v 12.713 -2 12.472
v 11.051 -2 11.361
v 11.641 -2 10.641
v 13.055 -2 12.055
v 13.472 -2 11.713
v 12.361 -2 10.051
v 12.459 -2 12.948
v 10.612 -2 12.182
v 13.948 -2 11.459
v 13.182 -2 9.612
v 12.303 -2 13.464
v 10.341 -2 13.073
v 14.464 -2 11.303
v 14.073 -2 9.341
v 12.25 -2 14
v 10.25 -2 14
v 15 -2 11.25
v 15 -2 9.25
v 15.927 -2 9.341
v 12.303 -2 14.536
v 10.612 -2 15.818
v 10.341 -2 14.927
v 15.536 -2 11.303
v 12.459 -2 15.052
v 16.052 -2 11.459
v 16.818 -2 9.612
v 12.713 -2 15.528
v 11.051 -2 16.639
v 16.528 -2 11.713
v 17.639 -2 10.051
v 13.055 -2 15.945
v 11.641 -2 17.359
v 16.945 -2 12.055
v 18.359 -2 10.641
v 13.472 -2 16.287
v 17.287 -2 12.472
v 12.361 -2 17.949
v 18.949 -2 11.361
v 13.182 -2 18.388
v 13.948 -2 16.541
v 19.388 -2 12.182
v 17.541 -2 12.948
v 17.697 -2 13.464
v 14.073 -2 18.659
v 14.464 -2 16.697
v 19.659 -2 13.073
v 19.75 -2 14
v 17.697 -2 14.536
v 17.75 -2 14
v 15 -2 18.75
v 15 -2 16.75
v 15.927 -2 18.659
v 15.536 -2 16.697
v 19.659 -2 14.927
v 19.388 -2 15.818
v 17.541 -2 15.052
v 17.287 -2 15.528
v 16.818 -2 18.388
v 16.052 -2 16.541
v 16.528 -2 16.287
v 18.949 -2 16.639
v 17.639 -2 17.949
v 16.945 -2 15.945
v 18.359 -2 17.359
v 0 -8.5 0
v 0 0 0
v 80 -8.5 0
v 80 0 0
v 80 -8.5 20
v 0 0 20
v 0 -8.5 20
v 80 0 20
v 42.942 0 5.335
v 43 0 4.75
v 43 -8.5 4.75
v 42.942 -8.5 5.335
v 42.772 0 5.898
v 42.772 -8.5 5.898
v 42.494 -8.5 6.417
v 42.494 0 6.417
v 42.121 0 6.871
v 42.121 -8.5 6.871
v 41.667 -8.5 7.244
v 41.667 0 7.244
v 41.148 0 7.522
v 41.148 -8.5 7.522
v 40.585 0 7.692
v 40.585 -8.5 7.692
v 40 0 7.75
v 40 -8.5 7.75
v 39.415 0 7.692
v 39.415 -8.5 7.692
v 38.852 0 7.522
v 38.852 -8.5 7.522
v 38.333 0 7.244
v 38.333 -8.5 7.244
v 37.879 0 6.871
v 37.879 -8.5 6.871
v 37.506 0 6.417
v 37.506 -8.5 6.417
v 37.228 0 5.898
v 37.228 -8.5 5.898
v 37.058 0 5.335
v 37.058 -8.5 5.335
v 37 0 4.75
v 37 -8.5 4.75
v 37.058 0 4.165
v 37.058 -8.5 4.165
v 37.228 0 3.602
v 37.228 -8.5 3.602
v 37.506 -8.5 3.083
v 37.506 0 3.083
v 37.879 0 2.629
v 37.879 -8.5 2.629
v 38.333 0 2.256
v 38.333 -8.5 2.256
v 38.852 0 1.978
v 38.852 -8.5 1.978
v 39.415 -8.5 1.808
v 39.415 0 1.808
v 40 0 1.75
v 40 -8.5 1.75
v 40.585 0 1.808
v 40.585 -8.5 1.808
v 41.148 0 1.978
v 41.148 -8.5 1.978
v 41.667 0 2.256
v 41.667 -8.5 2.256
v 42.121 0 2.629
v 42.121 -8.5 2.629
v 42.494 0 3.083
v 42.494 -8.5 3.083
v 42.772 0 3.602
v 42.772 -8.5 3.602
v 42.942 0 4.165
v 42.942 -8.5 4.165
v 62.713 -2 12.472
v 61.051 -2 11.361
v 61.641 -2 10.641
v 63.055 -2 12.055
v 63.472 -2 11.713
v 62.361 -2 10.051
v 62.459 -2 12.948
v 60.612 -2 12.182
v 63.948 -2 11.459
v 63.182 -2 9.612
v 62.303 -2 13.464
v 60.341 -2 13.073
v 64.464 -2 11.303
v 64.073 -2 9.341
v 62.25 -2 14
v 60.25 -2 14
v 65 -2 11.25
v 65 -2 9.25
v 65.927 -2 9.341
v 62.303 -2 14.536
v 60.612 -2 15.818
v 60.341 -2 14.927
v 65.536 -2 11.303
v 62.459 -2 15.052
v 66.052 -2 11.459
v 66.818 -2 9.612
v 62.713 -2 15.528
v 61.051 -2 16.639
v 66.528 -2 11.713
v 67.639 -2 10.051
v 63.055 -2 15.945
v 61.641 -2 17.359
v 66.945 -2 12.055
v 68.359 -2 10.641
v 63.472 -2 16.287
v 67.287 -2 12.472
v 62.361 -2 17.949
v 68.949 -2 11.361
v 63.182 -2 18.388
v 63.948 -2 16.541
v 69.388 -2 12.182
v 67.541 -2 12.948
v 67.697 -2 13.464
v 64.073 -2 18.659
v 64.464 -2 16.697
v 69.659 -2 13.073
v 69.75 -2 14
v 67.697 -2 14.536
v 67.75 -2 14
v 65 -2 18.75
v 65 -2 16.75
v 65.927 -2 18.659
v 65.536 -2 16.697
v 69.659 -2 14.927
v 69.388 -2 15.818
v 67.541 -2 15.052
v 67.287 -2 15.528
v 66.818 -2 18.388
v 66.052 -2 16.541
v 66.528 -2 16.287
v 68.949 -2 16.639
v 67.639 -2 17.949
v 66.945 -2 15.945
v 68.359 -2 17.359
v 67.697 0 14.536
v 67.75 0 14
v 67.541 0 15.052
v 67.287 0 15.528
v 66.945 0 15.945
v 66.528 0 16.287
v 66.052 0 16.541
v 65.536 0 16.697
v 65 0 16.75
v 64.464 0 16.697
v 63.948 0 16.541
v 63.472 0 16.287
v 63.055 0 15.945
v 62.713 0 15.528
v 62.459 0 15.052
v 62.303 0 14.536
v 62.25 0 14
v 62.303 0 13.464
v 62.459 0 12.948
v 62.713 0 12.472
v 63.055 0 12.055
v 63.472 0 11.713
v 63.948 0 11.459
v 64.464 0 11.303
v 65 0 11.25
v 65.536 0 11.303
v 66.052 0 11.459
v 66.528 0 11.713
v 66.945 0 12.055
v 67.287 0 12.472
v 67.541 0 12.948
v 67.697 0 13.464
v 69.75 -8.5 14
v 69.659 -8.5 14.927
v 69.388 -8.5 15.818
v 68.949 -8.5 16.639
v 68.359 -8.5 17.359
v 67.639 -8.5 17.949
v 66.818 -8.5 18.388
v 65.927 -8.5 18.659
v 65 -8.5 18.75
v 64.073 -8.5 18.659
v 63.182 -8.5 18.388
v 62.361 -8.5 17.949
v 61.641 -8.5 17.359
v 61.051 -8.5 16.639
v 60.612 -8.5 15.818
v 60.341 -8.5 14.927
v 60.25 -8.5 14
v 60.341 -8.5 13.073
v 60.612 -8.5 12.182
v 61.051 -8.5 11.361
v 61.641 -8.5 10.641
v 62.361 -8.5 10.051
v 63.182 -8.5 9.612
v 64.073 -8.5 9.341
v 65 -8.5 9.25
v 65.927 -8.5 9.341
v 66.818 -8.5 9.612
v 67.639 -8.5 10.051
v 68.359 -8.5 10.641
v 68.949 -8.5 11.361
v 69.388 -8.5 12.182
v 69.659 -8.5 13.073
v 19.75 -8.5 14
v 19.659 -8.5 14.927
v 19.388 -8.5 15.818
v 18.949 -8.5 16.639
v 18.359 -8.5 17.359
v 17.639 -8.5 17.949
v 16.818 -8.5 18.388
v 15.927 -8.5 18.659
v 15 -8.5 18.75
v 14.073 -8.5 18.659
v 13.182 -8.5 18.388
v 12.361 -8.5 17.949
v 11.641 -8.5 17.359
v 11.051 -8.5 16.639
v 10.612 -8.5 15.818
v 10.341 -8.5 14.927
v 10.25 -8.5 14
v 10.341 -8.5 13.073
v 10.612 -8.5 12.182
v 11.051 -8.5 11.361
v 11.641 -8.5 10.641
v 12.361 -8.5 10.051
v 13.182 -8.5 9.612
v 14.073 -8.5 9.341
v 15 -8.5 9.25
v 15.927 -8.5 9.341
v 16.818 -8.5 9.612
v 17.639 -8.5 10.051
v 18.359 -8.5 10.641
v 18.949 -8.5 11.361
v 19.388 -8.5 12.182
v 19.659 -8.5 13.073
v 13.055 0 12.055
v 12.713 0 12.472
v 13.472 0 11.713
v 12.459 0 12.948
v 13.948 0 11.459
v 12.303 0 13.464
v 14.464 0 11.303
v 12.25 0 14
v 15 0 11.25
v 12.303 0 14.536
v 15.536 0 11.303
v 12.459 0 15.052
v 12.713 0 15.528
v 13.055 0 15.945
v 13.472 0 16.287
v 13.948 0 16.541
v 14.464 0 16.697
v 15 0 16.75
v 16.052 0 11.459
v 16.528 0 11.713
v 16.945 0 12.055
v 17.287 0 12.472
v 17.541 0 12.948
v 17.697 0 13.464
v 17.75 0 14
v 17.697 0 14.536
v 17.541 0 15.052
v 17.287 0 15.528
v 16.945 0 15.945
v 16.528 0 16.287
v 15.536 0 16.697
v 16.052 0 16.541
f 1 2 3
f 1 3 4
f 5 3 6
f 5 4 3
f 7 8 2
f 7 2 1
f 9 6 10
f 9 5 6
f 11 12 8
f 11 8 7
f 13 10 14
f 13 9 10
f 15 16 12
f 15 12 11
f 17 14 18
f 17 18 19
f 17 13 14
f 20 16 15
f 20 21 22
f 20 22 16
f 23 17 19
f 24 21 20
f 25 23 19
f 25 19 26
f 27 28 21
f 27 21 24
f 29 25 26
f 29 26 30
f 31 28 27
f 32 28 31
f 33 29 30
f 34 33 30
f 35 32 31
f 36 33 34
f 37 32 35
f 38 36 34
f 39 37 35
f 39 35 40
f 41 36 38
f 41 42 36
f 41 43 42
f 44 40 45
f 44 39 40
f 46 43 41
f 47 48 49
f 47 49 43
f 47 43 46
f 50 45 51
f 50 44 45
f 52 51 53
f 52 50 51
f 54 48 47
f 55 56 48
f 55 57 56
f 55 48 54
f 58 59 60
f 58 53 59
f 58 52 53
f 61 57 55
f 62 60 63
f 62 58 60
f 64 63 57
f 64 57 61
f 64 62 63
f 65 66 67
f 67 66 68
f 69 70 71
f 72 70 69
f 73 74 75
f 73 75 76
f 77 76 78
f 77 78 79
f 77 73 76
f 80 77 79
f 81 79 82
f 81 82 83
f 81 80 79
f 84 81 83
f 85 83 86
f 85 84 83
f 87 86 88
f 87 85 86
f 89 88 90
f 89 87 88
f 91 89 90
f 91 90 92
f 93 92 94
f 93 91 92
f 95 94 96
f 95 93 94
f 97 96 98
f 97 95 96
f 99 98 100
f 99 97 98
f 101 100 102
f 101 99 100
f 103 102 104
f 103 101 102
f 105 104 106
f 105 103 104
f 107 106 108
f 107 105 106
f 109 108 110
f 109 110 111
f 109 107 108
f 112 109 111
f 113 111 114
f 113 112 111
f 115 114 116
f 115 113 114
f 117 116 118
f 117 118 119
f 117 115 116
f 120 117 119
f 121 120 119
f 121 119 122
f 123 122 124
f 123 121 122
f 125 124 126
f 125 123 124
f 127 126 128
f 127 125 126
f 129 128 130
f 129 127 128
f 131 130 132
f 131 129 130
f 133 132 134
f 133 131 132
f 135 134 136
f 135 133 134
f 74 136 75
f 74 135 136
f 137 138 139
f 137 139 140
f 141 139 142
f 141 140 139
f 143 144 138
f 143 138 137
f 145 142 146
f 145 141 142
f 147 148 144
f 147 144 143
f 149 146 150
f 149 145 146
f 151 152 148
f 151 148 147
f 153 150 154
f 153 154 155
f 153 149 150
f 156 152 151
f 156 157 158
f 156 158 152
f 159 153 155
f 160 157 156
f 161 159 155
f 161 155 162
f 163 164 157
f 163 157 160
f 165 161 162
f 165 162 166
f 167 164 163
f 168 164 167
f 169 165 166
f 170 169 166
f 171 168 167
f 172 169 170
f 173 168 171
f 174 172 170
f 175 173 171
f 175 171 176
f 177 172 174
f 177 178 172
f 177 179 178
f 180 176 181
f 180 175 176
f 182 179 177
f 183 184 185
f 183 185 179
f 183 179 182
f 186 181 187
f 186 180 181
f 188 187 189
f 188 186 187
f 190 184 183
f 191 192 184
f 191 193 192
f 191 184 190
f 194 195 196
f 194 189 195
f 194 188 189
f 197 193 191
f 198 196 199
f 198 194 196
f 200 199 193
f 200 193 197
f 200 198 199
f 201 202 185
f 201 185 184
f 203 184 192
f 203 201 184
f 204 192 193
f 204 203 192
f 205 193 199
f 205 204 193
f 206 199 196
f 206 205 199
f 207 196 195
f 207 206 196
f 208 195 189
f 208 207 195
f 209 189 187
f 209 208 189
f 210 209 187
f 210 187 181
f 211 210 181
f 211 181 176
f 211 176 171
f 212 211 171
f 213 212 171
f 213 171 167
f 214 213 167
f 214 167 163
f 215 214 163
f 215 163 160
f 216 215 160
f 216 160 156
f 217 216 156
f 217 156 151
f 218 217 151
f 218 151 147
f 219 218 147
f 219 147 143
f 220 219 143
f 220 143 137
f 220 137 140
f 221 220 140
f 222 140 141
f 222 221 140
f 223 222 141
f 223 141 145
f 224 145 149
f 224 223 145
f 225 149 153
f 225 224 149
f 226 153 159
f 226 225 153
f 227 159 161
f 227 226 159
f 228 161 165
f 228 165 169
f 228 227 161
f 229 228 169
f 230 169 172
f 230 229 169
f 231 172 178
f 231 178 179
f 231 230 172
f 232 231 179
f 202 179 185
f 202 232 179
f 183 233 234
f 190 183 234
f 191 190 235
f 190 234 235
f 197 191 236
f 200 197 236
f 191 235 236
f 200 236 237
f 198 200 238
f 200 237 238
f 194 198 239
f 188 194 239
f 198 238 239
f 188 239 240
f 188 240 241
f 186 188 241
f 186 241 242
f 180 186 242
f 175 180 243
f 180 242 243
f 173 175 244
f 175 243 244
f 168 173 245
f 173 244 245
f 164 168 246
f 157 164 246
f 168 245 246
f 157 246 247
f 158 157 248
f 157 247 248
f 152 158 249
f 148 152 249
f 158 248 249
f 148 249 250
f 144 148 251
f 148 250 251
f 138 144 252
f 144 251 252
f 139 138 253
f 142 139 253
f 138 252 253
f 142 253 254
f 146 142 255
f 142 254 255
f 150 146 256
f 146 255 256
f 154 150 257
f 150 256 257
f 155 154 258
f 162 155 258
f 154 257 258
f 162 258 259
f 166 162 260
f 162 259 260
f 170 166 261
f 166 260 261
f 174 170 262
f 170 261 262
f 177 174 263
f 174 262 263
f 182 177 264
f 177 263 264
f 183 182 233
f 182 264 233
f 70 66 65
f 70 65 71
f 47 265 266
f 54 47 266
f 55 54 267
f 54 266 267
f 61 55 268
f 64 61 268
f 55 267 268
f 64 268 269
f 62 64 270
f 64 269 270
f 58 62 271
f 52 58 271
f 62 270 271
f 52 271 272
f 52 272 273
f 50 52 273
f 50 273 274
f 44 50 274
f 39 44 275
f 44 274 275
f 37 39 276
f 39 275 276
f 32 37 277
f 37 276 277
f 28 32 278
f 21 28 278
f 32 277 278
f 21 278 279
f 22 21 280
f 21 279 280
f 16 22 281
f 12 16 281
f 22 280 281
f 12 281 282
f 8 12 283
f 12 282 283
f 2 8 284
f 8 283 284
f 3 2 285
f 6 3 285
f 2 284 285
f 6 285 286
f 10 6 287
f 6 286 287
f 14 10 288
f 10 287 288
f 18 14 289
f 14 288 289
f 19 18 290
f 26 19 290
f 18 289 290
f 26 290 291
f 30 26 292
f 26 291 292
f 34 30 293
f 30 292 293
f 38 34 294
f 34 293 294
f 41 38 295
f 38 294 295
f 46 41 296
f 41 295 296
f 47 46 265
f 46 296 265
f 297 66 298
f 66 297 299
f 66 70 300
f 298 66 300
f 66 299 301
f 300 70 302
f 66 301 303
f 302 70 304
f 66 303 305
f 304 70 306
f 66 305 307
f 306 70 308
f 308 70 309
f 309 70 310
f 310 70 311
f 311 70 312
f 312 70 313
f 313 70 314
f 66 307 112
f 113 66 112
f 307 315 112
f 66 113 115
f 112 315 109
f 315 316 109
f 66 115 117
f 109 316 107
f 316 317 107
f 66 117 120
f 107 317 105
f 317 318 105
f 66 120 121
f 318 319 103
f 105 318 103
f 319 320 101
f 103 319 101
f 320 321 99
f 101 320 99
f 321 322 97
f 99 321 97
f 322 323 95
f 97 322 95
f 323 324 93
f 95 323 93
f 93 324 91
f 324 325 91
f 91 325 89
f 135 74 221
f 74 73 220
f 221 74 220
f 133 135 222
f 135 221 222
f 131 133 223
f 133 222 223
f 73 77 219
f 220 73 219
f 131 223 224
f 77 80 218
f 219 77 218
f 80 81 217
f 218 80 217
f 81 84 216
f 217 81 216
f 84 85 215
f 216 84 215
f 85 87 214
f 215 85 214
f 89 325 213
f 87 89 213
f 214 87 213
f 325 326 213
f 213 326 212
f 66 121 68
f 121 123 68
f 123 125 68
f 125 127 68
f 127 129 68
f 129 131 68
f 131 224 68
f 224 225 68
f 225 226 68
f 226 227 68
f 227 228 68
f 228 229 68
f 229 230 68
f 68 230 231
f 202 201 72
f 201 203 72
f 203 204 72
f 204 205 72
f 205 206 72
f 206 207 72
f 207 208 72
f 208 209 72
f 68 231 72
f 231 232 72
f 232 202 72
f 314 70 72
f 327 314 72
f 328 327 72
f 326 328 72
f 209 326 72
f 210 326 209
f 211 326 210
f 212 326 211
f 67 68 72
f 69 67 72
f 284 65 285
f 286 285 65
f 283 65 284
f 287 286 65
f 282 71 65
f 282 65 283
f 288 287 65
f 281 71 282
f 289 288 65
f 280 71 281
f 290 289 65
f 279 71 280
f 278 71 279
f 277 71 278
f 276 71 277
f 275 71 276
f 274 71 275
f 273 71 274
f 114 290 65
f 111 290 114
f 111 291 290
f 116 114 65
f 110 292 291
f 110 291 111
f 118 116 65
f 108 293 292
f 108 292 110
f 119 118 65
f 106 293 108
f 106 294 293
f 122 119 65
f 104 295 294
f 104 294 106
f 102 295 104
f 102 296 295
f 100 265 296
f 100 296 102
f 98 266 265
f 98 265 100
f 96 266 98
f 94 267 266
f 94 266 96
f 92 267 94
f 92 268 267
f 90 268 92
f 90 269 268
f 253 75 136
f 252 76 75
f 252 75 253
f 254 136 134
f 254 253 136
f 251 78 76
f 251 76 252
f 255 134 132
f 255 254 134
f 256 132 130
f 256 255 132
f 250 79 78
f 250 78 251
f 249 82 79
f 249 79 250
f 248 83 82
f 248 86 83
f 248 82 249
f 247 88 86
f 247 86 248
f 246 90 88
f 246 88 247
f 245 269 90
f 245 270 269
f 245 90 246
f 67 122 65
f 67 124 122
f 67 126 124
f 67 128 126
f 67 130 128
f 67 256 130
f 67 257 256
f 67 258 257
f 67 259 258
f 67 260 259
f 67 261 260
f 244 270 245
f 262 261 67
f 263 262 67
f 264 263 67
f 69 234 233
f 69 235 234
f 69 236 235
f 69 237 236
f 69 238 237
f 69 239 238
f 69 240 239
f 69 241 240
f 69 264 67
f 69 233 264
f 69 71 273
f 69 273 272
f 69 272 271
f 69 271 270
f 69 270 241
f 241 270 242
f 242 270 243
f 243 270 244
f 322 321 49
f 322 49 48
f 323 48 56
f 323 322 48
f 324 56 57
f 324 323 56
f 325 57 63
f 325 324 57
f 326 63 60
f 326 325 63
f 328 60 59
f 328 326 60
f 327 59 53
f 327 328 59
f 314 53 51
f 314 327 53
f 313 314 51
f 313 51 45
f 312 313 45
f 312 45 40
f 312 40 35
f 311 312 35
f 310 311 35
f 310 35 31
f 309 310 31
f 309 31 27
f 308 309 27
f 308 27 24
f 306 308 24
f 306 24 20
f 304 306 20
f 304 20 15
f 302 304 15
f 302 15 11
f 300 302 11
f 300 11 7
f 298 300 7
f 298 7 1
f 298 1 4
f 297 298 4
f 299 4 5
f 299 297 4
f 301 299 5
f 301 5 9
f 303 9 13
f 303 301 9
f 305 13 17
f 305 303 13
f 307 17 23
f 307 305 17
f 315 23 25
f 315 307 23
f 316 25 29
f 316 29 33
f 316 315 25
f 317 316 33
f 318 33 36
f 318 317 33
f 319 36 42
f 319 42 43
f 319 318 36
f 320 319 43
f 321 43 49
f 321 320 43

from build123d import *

# Parameters (mm, degrees)
F0_W     = 80
F0_H     = 20
F0_R     = 3
F0_R_2   = 2.75
F1_DEPTH = 8.5
F2_R     = 4.75
F2_R_2   = 2.75
F3_DEPTH = 6.5


with BuildPart() as f1:
    # F0 (on Front) → F1 (new body)
    with BuildSketch(Plane.XZ):
        with Locations((40, 10)):
            Rectangle(F0_W, F0_H)
        with Locations((40, 4.75)):
            Circle(F0_R, mode=Mode.SUBTRACT)
        with Locations((15, 14)):
            Circle(F0_R_2, mode=Mode.SUBTRACT)
        with Locations((65, 14)):
            Circle(F0_R_2, mode=Mode.SUBTRACT)
    extrude(amount=F1_DEPTH)

    # F2 (on face) → F3 (cut)
    with BuildSketch(Plane.XZ.offset(8.5)):
        with Locations((15, 14)):
            Circle(F2_R)
        with Locations((15, 14)):
            Circle(F2_R_2, mode=Mode.SUBTRACT)
        with Locations((65, 14)):
            Circle(F2_R)
        with Locations((65, 14)):
            Circle(F2_R_2, mode=Mode.SUBTRACT)
    extrude(amount=-F3_DEPTH, mode=Mode.SUBTRACT)


solid = f1.part
